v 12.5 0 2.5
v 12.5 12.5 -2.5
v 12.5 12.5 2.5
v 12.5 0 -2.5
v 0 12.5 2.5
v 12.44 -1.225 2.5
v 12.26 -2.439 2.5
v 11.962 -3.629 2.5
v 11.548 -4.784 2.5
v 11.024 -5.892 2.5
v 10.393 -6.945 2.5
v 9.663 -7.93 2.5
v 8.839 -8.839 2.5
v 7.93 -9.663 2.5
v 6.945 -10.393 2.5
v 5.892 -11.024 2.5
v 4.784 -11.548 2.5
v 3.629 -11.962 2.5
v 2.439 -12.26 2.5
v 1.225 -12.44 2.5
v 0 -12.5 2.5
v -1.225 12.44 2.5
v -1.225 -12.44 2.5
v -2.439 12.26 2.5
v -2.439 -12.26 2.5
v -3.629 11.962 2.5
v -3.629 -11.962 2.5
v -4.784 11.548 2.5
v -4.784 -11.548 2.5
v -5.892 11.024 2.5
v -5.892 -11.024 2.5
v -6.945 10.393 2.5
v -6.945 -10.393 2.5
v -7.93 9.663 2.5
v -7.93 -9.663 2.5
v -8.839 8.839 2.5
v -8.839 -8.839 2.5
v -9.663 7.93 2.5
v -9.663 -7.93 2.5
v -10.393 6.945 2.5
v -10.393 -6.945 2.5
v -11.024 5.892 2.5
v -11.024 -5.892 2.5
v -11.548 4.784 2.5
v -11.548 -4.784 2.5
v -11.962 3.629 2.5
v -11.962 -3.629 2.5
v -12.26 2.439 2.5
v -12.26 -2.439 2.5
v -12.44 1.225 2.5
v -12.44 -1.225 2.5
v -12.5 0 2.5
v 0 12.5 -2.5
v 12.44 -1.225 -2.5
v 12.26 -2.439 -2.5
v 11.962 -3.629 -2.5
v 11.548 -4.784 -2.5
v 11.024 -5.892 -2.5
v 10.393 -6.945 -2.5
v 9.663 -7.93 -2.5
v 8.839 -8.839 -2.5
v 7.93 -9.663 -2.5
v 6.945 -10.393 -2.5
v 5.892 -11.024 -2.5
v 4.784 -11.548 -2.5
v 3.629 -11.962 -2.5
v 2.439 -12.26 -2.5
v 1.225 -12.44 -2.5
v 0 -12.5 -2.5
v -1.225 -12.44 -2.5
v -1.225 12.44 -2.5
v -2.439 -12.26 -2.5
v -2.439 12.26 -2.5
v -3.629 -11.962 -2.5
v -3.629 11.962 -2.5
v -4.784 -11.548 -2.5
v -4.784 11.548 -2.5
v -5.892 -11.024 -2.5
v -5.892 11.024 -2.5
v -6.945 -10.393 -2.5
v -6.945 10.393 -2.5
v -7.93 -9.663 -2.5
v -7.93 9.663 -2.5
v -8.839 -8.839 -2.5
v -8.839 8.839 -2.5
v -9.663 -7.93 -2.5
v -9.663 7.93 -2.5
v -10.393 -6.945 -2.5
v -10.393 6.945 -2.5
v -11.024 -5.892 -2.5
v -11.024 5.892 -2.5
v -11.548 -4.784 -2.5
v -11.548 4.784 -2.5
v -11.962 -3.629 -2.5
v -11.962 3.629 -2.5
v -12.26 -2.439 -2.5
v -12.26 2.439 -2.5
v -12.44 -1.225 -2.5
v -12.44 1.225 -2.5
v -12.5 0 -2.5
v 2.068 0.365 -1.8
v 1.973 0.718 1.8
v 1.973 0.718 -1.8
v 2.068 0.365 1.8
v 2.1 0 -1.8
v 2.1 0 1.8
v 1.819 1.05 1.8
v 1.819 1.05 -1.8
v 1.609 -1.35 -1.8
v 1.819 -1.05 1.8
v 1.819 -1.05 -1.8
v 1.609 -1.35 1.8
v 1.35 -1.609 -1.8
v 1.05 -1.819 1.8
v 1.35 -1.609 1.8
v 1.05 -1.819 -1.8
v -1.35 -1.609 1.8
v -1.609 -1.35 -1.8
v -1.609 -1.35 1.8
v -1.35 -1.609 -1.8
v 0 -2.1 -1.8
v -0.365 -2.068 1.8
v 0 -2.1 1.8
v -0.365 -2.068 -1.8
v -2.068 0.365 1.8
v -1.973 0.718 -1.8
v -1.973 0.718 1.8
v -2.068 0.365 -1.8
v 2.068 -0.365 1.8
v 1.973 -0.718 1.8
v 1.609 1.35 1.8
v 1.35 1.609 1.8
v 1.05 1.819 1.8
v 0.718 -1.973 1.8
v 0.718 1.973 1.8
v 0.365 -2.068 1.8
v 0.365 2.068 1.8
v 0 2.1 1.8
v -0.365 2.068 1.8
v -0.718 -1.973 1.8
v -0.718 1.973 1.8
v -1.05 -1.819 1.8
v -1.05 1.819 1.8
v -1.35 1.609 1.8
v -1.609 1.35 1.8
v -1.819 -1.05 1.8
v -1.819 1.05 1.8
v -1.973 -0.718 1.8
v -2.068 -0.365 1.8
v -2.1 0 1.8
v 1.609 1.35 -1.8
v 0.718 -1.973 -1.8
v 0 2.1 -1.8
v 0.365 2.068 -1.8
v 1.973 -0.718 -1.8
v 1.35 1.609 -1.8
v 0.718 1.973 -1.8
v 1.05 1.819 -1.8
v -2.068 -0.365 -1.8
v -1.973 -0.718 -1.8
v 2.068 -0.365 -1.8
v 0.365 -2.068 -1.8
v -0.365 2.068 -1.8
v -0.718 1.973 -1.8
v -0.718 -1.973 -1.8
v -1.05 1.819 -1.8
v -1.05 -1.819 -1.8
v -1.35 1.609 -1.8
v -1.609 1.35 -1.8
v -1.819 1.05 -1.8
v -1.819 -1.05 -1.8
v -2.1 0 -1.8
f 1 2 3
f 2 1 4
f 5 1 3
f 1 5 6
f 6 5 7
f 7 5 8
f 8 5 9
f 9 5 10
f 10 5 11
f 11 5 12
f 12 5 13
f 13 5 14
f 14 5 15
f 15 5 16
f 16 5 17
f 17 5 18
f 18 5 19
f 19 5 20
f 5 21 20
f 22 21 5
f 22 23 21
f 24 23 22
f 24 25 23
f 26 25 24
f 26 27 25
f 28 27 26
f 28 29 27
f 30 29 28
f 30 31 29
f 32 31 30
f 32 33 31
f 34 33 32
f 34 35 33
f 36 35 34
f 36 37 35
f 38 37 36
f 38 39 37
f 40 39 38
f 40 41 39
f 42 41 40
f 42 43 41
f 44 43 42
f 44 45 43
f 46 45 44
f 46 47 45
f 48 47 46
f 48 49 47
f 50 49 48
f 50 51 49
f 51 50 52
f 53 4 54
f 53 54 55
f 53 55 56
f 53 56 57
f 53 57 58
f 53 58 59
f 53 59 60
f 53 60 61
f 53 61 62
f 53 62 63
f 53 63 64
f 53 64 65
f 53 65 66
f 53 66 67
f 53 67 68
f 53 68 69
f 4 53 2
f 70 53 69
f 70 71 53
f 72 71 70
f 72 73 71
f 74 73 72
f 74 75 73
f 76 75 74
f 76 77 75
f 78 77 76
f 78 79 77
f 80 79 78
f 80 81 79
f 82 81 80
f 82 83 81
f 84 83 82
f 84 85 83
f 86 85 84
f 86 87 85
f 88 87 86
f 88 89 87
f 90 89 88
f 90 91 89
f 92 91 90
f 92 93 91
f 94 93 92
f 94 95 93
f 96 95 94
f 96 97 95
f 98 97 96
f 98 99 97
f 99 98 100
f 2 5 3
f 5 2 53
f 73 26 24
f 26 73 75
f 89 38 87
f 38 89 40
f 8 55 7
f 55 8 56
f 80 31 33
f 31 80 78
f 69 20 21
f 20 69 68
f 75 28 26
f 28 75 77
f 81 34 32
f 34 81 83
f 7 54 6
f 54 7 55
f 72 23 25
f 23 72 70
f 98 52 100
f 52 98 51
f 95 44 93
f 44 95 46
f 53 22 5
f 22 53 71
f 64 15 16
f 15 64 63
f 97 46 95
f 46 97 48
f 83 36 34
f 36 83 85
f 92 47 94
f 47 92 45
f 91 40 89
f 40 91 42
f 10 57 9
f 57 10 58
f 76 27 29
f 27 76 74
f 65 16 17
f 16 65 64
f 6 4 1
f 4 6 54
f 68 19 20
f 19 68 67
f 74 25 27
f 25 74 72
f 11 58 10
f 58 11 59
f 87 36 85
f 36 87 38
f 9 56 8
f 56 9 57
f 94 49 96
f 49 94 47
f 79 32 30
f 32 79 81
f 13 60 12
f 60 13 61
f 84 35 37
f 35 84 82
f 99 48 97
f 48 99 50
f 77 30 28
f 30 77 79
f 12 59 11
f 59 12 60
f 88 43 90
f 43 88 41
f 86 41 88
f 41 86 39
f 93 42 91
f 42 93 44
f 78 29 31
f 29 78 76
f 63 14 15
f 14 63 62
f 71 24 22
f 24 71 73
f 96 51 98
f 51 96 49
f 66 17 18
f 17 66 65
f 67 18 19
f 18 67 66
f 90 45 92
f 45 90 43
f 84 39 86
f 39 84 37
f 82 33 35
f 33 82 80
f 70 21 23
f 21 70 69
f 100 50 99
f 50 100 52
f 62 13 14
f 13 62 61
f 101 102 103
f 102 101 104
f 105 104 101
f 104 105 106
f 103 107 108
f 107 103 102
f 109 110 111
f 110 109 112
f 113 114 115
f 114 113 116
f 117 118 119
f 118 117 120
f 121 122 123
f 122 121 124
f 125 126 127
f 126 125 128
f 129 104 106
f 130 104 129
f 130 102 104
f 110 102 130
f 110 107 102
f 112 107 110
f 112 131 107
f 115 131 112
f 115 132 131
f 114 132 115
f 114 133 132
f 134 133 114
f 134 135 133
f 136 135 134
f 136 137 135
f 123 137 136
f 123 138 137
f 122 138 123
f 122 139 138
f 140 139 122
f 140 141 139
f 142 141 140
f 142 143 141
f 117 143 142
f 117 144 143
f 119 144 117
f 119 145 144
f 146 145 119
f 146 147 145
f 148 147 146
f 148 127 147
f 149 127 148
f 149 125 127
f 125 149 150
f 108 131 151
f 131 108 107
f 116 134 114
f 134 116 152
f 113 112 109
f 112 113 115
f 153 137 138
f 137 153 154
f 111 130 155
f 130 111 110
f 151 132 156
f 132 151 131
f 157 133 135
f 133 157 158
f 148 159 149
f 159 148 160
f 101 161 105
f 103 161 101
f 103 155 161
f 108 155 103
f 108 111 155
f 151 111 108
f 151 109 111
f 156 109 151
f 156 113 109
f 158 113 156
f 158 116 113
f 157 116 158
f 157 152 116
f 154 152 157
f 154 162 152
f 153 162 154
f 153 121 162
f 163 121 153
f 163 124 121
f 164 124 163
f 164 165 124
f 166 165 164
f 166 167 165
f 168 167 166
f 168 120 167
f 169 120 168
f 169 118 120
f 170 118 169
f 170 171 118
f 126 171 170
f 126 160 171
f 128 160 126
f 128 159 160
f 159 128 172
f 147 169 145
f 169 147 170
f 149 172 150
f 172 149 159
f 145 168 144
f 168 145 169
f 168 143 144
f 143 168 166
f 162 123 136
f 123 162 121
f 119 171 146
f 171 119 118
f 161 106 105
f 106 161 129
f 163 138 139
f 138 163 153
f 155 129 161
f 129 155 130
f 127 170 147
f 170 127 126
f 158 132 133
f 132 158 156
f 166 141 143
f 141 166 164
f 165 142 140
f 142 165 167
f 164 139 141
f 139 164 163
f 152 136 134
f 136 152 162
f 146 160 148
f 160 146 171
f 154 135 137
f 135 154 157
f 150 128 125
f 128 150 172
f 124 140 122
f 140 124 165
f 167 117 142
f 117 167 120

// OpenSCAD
// magbase.scad
//
// unit is mm

o2 = 0.2;
br = 1.7; // ball radius

module balcyl() {

  hf = 2;
  h = br * hf + o2;

  dz = hf > 2 ? -3 * o2 : 0;

  translate([ 0, 0, dz ])
    cylinder(r=br + 2 * o2, h=h, center=true, $fn=36);
}

module magbase0(rad, height) {
  difference() {
    union() {
      translate([ rad/2, rad/2, 0 ]) cube([ rad, rad, height ], center=true);
      cylinder(h=height, r=rad, center=true);
    }
    balcyl();
  }
}

magbase0(25/2, 5, $fn=64);
